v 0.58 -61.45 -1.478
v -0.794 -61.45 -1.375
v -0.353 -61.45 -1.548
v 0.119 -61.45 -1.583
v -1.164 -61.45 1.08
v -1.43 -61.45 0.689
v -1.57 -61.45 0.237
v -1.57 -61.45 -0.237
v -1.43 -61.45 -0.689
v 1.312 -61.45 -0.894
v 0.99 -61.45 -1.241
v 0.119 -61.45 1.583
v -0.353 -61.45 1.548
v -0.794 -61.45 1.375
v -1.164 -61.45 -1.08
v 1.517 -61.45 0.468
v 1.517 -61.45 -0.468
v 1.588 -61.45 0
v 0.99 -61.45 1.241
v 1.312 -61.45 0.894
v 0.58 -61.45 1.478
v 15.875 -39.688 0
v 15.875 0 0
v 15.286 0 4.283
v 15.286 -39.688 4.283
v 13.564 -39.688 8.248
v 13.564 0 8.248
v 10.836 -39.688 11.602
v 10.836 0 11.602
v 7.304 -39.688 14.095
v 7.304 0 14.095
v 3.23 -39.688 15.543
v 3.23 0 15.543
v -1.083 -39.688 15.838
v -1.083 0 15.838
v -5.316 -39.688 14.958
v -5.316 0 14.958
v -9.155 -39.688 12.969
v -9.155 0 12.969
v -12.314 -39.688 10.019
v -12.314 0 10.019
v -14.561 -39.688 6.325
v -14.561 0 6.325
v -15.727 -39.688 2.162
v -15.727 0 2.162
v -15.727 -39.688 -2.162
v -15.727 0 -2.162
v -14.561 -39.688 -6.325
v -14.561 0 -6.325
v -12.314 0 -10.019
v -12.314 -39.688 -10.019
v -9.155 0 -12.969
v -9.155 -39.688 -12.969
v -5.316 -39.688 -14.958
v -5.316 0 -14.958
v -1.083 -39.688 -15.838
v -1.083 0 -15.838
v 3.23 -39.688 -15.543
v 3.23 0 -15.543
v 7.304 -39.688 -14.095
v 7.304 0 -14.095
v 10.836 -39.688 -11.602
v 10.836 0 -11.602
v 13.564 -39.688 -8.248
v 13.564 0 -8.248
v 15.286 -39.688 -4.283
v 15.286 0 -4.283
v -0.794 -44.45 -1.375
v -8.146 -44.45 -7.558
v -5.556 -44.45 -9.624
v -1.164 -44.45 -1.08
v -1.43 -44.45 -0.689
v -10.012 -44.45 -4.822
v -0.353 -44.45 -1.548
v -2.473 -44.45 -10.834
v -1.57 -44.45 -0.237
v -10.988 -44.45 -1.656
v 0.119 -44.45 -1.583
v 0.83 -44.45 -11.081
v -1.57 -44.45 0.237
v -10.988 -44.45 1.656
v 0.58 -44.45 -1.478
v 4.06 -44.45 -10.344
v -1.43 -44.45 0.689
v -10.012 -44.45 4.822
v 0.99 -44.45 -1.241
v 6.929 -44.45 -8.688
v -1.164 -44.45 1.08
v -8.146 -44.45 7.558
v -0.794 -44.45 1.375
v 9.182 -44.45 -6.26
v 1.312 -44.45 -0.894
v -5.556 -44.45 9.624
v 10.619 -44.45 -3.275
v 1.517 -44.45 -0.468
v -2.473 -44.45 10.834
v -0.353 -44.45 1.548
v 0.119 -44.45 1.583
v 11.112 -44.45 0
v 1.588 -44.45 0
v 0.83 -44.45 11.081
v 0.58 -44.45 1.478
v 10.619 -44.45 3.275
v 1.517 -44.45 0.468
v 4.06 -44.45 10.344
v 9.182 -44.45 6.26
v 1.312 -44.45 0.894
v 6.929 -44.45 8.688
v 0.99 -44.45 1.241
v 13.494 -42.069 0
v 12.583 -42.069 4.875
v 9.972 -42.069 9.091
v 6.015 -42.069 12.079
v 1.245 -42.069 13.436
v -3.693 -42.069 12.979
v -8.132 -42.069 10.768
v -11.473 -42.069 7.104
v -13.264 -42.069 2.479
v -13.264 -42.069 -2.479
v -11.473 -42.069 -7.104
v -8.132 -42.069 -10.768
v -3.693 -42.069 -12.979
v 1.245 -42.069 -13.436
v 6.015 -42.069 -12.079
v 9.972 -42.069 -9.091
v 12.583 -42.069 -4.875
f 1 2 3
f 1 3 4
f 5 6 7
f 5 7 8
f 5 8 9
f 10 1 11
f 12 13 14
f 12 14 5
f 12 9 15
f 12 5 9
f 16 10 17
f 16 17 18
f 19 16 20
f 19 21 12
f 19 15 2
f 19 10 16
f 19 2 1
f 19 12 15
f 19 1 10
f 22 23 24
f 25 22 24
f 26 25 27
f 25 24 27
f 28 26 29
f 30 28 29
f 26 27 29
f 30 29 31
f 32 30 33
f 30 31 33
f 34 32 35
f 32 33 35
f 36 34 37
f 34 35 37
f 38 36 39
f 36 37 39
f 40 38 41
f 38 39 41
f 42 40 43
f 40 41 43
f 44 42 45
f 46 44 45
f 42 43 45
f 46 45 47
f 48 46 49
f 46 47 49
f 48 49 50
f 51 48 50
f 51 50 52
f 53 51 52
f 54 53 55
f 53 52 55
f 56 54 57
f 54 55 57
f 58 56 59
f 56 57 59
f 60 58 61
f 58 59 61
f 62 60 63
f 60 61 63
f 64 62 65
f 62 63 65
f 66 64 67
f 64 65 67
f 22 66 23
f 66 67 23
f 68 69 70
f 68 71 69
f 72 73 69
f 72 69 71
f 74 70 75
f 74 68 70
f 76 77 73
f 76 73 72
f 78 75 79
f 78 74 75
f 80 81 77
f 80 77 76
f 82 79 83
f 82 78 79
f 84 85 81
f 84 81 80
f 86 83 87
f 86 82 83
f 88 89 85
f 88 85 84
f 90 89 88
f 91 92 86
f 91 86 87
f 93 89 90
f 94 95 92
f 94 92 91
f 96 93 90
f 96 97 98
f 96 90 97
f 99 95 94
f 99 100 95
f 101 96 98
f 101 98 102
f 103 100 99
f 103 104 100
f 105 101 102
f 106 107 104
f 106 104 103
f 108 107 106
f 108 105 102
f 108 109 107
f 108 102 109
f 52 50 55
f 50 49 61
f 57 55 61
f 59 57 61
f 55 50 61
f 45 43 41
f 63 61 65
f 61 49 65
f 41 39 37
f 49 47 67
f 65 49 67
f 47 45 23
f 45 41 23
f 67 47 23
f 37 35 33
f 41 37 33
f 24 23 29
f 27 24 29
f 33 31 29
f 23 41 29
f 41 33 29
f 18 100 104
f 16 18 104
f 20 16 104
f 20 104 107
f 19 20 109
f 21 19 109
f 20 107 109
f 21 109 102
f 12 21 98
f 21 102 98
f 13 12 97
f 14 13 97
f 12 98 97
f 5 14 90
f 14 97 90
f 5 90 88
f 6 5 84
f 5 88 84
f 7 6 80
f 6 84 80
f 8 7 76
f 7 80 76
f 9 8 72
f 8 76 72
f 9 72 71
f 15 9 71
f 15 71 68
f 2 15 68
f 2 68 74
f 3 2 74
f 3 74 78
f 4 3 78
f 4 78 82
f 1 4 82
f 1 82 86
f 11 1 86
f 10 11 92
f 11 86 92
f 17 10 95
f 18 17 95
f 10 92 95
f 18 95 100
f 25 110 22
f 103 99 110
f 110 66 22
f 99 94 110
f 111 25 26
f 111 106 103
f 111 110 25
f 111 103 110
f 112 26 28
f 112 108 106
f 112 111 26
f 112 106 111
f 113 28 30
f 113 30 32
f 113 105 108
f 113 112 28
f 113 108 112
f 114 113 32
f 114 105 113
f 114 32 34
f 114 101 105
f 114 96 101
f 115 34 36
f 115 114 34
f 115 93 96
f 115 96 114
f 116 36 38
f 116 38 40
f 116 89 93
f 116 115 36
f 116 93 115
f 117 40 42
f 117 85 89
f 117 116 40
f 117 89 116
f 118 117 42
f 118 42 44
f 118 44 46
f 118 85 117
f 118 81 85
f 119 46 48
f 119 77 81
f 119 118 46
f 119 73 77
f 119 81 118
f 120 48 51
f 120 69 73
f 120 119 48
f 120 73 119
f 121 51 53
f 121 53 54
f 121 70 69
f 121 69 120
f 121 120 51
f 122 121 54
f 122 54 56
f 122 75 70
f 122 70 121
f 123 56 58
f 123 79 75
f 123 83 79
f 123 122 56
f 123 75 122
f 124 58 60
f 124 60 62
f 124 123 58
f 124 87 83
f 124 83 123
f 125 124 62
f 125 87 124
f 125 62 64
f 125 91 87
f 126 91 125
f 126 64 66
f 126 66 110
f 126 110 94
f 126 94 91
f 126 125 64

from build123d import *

# Parameters (mm, degrees)
F0_R     = 15.875
F1_DEPTH = 44.45
F2_SIZE  = 4.7625
F3_R     = 1.5875
F4_DEPTH = 17


with BuildPart() as f1:
    # F0 (on Front) → F1 (new body)
    with BuildSketch(Plane.XZ):
        Circle(F0_R)
    extrude(amount=F1_DEPTH)

    # F2
    f2_edges = [f1.edges().sort_by_distance(p)[0] for p in [
        (-15.875, -44.45, 0),
    ]]
    chamfer(f2_edges, length=F2_SIZE)

    # F3 (on face) → F4 (join)
    with BuildSketch(Plane.XZ.offset(44.45)):
        Circle(F3_R)
    extrude(amount=F4_DEPTH)


solid = f1.part
